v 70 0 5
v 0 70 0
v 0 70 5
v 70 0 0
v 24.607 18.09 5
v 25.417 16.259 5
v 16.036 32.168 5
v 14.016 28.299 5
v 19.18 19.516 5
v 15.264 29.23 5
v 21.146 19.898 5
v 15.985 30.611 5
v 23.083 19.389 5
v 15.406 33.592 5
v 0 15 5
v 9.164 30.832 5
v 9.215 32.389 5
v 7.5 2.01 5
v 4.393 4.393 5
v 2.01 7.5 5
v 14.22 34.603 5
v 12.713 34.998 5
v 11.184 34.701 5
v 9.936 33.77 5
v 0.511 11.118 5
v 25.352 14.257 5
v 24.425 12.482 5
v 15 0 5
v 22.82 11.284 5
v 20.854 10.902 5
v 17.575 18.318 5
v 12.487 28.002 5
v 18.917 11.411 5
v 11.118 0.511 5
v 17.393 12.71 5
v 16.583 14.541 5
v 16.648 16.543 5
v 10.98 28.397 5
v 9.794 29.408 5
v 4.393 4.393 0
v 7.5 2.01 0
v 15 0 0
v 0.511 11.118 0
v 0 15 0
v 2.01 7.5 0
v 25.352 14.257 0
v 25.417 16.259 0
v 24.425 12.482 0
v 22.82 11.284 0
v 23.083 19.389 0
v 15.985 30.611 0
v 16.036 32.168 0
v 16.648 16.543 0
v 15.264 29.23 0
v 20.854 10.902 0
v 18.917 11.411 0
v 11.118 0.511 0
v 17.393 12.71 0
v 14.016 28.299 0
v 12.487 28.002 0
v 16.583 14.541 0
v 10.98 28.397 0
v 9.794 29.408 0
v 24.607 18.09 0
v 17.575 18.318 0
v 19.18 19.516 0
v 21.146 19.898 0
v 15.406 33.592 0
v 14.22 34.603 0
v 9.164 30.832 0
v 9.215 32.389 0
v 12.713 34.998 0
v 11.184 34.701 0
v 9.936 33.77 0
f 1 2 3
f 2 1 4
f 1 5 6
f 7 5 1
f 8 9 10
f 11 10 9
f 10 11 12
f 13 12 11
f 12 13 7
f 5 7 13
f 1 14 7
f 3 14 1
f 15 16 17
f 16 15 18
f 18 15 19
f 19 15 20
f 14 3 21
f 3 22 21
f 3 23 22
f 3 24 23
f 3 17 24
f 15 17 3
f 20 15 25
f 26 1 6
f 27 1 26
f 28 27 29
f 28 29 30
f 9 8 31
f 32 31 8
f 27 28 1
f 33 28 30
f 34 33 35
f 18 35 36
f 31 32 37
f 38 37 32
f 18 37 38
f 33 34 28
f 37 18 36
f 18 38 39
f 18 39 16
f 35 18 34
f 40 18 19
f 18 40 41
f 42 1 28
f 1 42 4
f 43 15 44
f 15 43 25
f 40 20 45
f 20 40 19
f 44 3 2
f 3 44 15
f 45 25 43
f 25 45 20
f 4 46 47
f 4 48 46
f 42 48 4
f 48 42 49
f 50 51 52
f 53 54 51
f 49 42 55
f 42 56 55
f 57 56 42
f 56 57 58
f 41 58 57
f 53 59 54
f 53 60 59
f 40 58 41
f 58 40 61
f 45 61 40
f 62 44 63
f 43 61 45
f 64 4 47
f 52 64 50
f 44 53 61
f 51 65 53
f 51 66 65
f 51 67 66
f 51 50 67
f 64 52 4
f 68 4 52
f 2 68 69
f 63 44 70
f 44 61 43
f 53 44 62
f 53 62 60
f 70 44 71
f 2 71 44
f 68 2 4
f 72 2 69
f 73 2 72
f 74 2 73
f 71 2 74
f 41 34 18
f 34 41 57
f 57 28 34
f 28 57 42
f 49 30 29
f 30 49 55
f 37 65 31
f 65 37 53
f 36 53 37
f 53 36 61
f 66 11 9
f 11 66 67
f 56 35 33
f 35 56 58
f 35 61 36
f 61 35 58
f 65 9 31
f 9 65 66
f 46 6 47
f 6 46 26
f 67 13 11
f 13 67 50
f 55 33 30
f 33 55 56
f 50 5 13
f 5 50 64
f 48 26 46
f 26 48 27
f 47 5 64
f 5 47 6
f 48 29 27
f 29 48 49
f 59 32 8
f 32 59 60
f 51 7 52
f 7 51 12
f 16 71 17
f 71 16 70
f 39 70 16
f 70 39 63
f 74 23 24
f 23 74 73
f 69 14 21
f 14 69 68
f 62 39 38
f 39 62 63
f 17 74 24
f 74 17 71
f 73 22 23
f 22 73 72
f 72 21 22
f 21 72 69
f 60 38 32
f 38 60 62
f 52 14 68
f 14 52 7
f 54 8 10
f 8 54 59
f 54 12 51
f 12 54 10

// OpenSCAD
$fn = 32;

// ----------------------------------------------------------------------
// Bracket plate: corner pad 70 x 70, fillet R15
// ----------------------------------------------------------------------

// --- parameters (mm) ---
hole_r = 3.5;             // bolt hole radius
plate_t = 5;              // plate thickness, Z (extrusion height)
leg_a = 70;               // base leg
leg_b = 70;               // height leg
fillet_r = 15;            // right-angle fillet radius

hole_d1 = 2 * hole_r + 2;
hole_d2 = 2 * hole_r;

profile = [[15, 0], [70, 0], [0, 70], [0, 15], [0.511, 11.118], [2.01, 7.5], [4.393, 4.393], [7.5, 2.01], [11.118, 0.511]];  // primary outline, 9 points, counter clockwise
void_1 = [[25.417, 16.259], [24.607, 18.09], [23.083, 19.389], [21.146, 19.898], [19.18, 19.516], [17.575, 18.318], [16.648, 16.543], [16.583, 14.541], [17.393, 12.71], [18.917, 11.411], [20.854, 10.902], [22.82, 11.284], [24.425, 12.482], [25.352, 14.257]];  // mount hole 1, 14 points
void_2 = [[16.036, 32.168], [15.406, 33.592], [14.22, 34.603], [12.713, 34.998], [11.184, 34.701], [9.936, 33.77], [9.215, 32.389], [9.164, 30.832], [9.794, 29.408], [10.98, 28.397], [12.487, 28.002], [14.016, 28.299], [15.264, 29.23], [15.985, 30.611]];  // mount hole 2, 14 points

// --- the one profile operation ---
difference() {
  linear_extrude(height = plate_t) polygon(points = profile);
  translate([0, 0, -1])
    linear_extrude(height = plate_t + 2) polygon(points = void_1);
  translate([0, 0, -1])
    linear_extrude(height = plate_t + 2) polygon(points = void_2);
}
